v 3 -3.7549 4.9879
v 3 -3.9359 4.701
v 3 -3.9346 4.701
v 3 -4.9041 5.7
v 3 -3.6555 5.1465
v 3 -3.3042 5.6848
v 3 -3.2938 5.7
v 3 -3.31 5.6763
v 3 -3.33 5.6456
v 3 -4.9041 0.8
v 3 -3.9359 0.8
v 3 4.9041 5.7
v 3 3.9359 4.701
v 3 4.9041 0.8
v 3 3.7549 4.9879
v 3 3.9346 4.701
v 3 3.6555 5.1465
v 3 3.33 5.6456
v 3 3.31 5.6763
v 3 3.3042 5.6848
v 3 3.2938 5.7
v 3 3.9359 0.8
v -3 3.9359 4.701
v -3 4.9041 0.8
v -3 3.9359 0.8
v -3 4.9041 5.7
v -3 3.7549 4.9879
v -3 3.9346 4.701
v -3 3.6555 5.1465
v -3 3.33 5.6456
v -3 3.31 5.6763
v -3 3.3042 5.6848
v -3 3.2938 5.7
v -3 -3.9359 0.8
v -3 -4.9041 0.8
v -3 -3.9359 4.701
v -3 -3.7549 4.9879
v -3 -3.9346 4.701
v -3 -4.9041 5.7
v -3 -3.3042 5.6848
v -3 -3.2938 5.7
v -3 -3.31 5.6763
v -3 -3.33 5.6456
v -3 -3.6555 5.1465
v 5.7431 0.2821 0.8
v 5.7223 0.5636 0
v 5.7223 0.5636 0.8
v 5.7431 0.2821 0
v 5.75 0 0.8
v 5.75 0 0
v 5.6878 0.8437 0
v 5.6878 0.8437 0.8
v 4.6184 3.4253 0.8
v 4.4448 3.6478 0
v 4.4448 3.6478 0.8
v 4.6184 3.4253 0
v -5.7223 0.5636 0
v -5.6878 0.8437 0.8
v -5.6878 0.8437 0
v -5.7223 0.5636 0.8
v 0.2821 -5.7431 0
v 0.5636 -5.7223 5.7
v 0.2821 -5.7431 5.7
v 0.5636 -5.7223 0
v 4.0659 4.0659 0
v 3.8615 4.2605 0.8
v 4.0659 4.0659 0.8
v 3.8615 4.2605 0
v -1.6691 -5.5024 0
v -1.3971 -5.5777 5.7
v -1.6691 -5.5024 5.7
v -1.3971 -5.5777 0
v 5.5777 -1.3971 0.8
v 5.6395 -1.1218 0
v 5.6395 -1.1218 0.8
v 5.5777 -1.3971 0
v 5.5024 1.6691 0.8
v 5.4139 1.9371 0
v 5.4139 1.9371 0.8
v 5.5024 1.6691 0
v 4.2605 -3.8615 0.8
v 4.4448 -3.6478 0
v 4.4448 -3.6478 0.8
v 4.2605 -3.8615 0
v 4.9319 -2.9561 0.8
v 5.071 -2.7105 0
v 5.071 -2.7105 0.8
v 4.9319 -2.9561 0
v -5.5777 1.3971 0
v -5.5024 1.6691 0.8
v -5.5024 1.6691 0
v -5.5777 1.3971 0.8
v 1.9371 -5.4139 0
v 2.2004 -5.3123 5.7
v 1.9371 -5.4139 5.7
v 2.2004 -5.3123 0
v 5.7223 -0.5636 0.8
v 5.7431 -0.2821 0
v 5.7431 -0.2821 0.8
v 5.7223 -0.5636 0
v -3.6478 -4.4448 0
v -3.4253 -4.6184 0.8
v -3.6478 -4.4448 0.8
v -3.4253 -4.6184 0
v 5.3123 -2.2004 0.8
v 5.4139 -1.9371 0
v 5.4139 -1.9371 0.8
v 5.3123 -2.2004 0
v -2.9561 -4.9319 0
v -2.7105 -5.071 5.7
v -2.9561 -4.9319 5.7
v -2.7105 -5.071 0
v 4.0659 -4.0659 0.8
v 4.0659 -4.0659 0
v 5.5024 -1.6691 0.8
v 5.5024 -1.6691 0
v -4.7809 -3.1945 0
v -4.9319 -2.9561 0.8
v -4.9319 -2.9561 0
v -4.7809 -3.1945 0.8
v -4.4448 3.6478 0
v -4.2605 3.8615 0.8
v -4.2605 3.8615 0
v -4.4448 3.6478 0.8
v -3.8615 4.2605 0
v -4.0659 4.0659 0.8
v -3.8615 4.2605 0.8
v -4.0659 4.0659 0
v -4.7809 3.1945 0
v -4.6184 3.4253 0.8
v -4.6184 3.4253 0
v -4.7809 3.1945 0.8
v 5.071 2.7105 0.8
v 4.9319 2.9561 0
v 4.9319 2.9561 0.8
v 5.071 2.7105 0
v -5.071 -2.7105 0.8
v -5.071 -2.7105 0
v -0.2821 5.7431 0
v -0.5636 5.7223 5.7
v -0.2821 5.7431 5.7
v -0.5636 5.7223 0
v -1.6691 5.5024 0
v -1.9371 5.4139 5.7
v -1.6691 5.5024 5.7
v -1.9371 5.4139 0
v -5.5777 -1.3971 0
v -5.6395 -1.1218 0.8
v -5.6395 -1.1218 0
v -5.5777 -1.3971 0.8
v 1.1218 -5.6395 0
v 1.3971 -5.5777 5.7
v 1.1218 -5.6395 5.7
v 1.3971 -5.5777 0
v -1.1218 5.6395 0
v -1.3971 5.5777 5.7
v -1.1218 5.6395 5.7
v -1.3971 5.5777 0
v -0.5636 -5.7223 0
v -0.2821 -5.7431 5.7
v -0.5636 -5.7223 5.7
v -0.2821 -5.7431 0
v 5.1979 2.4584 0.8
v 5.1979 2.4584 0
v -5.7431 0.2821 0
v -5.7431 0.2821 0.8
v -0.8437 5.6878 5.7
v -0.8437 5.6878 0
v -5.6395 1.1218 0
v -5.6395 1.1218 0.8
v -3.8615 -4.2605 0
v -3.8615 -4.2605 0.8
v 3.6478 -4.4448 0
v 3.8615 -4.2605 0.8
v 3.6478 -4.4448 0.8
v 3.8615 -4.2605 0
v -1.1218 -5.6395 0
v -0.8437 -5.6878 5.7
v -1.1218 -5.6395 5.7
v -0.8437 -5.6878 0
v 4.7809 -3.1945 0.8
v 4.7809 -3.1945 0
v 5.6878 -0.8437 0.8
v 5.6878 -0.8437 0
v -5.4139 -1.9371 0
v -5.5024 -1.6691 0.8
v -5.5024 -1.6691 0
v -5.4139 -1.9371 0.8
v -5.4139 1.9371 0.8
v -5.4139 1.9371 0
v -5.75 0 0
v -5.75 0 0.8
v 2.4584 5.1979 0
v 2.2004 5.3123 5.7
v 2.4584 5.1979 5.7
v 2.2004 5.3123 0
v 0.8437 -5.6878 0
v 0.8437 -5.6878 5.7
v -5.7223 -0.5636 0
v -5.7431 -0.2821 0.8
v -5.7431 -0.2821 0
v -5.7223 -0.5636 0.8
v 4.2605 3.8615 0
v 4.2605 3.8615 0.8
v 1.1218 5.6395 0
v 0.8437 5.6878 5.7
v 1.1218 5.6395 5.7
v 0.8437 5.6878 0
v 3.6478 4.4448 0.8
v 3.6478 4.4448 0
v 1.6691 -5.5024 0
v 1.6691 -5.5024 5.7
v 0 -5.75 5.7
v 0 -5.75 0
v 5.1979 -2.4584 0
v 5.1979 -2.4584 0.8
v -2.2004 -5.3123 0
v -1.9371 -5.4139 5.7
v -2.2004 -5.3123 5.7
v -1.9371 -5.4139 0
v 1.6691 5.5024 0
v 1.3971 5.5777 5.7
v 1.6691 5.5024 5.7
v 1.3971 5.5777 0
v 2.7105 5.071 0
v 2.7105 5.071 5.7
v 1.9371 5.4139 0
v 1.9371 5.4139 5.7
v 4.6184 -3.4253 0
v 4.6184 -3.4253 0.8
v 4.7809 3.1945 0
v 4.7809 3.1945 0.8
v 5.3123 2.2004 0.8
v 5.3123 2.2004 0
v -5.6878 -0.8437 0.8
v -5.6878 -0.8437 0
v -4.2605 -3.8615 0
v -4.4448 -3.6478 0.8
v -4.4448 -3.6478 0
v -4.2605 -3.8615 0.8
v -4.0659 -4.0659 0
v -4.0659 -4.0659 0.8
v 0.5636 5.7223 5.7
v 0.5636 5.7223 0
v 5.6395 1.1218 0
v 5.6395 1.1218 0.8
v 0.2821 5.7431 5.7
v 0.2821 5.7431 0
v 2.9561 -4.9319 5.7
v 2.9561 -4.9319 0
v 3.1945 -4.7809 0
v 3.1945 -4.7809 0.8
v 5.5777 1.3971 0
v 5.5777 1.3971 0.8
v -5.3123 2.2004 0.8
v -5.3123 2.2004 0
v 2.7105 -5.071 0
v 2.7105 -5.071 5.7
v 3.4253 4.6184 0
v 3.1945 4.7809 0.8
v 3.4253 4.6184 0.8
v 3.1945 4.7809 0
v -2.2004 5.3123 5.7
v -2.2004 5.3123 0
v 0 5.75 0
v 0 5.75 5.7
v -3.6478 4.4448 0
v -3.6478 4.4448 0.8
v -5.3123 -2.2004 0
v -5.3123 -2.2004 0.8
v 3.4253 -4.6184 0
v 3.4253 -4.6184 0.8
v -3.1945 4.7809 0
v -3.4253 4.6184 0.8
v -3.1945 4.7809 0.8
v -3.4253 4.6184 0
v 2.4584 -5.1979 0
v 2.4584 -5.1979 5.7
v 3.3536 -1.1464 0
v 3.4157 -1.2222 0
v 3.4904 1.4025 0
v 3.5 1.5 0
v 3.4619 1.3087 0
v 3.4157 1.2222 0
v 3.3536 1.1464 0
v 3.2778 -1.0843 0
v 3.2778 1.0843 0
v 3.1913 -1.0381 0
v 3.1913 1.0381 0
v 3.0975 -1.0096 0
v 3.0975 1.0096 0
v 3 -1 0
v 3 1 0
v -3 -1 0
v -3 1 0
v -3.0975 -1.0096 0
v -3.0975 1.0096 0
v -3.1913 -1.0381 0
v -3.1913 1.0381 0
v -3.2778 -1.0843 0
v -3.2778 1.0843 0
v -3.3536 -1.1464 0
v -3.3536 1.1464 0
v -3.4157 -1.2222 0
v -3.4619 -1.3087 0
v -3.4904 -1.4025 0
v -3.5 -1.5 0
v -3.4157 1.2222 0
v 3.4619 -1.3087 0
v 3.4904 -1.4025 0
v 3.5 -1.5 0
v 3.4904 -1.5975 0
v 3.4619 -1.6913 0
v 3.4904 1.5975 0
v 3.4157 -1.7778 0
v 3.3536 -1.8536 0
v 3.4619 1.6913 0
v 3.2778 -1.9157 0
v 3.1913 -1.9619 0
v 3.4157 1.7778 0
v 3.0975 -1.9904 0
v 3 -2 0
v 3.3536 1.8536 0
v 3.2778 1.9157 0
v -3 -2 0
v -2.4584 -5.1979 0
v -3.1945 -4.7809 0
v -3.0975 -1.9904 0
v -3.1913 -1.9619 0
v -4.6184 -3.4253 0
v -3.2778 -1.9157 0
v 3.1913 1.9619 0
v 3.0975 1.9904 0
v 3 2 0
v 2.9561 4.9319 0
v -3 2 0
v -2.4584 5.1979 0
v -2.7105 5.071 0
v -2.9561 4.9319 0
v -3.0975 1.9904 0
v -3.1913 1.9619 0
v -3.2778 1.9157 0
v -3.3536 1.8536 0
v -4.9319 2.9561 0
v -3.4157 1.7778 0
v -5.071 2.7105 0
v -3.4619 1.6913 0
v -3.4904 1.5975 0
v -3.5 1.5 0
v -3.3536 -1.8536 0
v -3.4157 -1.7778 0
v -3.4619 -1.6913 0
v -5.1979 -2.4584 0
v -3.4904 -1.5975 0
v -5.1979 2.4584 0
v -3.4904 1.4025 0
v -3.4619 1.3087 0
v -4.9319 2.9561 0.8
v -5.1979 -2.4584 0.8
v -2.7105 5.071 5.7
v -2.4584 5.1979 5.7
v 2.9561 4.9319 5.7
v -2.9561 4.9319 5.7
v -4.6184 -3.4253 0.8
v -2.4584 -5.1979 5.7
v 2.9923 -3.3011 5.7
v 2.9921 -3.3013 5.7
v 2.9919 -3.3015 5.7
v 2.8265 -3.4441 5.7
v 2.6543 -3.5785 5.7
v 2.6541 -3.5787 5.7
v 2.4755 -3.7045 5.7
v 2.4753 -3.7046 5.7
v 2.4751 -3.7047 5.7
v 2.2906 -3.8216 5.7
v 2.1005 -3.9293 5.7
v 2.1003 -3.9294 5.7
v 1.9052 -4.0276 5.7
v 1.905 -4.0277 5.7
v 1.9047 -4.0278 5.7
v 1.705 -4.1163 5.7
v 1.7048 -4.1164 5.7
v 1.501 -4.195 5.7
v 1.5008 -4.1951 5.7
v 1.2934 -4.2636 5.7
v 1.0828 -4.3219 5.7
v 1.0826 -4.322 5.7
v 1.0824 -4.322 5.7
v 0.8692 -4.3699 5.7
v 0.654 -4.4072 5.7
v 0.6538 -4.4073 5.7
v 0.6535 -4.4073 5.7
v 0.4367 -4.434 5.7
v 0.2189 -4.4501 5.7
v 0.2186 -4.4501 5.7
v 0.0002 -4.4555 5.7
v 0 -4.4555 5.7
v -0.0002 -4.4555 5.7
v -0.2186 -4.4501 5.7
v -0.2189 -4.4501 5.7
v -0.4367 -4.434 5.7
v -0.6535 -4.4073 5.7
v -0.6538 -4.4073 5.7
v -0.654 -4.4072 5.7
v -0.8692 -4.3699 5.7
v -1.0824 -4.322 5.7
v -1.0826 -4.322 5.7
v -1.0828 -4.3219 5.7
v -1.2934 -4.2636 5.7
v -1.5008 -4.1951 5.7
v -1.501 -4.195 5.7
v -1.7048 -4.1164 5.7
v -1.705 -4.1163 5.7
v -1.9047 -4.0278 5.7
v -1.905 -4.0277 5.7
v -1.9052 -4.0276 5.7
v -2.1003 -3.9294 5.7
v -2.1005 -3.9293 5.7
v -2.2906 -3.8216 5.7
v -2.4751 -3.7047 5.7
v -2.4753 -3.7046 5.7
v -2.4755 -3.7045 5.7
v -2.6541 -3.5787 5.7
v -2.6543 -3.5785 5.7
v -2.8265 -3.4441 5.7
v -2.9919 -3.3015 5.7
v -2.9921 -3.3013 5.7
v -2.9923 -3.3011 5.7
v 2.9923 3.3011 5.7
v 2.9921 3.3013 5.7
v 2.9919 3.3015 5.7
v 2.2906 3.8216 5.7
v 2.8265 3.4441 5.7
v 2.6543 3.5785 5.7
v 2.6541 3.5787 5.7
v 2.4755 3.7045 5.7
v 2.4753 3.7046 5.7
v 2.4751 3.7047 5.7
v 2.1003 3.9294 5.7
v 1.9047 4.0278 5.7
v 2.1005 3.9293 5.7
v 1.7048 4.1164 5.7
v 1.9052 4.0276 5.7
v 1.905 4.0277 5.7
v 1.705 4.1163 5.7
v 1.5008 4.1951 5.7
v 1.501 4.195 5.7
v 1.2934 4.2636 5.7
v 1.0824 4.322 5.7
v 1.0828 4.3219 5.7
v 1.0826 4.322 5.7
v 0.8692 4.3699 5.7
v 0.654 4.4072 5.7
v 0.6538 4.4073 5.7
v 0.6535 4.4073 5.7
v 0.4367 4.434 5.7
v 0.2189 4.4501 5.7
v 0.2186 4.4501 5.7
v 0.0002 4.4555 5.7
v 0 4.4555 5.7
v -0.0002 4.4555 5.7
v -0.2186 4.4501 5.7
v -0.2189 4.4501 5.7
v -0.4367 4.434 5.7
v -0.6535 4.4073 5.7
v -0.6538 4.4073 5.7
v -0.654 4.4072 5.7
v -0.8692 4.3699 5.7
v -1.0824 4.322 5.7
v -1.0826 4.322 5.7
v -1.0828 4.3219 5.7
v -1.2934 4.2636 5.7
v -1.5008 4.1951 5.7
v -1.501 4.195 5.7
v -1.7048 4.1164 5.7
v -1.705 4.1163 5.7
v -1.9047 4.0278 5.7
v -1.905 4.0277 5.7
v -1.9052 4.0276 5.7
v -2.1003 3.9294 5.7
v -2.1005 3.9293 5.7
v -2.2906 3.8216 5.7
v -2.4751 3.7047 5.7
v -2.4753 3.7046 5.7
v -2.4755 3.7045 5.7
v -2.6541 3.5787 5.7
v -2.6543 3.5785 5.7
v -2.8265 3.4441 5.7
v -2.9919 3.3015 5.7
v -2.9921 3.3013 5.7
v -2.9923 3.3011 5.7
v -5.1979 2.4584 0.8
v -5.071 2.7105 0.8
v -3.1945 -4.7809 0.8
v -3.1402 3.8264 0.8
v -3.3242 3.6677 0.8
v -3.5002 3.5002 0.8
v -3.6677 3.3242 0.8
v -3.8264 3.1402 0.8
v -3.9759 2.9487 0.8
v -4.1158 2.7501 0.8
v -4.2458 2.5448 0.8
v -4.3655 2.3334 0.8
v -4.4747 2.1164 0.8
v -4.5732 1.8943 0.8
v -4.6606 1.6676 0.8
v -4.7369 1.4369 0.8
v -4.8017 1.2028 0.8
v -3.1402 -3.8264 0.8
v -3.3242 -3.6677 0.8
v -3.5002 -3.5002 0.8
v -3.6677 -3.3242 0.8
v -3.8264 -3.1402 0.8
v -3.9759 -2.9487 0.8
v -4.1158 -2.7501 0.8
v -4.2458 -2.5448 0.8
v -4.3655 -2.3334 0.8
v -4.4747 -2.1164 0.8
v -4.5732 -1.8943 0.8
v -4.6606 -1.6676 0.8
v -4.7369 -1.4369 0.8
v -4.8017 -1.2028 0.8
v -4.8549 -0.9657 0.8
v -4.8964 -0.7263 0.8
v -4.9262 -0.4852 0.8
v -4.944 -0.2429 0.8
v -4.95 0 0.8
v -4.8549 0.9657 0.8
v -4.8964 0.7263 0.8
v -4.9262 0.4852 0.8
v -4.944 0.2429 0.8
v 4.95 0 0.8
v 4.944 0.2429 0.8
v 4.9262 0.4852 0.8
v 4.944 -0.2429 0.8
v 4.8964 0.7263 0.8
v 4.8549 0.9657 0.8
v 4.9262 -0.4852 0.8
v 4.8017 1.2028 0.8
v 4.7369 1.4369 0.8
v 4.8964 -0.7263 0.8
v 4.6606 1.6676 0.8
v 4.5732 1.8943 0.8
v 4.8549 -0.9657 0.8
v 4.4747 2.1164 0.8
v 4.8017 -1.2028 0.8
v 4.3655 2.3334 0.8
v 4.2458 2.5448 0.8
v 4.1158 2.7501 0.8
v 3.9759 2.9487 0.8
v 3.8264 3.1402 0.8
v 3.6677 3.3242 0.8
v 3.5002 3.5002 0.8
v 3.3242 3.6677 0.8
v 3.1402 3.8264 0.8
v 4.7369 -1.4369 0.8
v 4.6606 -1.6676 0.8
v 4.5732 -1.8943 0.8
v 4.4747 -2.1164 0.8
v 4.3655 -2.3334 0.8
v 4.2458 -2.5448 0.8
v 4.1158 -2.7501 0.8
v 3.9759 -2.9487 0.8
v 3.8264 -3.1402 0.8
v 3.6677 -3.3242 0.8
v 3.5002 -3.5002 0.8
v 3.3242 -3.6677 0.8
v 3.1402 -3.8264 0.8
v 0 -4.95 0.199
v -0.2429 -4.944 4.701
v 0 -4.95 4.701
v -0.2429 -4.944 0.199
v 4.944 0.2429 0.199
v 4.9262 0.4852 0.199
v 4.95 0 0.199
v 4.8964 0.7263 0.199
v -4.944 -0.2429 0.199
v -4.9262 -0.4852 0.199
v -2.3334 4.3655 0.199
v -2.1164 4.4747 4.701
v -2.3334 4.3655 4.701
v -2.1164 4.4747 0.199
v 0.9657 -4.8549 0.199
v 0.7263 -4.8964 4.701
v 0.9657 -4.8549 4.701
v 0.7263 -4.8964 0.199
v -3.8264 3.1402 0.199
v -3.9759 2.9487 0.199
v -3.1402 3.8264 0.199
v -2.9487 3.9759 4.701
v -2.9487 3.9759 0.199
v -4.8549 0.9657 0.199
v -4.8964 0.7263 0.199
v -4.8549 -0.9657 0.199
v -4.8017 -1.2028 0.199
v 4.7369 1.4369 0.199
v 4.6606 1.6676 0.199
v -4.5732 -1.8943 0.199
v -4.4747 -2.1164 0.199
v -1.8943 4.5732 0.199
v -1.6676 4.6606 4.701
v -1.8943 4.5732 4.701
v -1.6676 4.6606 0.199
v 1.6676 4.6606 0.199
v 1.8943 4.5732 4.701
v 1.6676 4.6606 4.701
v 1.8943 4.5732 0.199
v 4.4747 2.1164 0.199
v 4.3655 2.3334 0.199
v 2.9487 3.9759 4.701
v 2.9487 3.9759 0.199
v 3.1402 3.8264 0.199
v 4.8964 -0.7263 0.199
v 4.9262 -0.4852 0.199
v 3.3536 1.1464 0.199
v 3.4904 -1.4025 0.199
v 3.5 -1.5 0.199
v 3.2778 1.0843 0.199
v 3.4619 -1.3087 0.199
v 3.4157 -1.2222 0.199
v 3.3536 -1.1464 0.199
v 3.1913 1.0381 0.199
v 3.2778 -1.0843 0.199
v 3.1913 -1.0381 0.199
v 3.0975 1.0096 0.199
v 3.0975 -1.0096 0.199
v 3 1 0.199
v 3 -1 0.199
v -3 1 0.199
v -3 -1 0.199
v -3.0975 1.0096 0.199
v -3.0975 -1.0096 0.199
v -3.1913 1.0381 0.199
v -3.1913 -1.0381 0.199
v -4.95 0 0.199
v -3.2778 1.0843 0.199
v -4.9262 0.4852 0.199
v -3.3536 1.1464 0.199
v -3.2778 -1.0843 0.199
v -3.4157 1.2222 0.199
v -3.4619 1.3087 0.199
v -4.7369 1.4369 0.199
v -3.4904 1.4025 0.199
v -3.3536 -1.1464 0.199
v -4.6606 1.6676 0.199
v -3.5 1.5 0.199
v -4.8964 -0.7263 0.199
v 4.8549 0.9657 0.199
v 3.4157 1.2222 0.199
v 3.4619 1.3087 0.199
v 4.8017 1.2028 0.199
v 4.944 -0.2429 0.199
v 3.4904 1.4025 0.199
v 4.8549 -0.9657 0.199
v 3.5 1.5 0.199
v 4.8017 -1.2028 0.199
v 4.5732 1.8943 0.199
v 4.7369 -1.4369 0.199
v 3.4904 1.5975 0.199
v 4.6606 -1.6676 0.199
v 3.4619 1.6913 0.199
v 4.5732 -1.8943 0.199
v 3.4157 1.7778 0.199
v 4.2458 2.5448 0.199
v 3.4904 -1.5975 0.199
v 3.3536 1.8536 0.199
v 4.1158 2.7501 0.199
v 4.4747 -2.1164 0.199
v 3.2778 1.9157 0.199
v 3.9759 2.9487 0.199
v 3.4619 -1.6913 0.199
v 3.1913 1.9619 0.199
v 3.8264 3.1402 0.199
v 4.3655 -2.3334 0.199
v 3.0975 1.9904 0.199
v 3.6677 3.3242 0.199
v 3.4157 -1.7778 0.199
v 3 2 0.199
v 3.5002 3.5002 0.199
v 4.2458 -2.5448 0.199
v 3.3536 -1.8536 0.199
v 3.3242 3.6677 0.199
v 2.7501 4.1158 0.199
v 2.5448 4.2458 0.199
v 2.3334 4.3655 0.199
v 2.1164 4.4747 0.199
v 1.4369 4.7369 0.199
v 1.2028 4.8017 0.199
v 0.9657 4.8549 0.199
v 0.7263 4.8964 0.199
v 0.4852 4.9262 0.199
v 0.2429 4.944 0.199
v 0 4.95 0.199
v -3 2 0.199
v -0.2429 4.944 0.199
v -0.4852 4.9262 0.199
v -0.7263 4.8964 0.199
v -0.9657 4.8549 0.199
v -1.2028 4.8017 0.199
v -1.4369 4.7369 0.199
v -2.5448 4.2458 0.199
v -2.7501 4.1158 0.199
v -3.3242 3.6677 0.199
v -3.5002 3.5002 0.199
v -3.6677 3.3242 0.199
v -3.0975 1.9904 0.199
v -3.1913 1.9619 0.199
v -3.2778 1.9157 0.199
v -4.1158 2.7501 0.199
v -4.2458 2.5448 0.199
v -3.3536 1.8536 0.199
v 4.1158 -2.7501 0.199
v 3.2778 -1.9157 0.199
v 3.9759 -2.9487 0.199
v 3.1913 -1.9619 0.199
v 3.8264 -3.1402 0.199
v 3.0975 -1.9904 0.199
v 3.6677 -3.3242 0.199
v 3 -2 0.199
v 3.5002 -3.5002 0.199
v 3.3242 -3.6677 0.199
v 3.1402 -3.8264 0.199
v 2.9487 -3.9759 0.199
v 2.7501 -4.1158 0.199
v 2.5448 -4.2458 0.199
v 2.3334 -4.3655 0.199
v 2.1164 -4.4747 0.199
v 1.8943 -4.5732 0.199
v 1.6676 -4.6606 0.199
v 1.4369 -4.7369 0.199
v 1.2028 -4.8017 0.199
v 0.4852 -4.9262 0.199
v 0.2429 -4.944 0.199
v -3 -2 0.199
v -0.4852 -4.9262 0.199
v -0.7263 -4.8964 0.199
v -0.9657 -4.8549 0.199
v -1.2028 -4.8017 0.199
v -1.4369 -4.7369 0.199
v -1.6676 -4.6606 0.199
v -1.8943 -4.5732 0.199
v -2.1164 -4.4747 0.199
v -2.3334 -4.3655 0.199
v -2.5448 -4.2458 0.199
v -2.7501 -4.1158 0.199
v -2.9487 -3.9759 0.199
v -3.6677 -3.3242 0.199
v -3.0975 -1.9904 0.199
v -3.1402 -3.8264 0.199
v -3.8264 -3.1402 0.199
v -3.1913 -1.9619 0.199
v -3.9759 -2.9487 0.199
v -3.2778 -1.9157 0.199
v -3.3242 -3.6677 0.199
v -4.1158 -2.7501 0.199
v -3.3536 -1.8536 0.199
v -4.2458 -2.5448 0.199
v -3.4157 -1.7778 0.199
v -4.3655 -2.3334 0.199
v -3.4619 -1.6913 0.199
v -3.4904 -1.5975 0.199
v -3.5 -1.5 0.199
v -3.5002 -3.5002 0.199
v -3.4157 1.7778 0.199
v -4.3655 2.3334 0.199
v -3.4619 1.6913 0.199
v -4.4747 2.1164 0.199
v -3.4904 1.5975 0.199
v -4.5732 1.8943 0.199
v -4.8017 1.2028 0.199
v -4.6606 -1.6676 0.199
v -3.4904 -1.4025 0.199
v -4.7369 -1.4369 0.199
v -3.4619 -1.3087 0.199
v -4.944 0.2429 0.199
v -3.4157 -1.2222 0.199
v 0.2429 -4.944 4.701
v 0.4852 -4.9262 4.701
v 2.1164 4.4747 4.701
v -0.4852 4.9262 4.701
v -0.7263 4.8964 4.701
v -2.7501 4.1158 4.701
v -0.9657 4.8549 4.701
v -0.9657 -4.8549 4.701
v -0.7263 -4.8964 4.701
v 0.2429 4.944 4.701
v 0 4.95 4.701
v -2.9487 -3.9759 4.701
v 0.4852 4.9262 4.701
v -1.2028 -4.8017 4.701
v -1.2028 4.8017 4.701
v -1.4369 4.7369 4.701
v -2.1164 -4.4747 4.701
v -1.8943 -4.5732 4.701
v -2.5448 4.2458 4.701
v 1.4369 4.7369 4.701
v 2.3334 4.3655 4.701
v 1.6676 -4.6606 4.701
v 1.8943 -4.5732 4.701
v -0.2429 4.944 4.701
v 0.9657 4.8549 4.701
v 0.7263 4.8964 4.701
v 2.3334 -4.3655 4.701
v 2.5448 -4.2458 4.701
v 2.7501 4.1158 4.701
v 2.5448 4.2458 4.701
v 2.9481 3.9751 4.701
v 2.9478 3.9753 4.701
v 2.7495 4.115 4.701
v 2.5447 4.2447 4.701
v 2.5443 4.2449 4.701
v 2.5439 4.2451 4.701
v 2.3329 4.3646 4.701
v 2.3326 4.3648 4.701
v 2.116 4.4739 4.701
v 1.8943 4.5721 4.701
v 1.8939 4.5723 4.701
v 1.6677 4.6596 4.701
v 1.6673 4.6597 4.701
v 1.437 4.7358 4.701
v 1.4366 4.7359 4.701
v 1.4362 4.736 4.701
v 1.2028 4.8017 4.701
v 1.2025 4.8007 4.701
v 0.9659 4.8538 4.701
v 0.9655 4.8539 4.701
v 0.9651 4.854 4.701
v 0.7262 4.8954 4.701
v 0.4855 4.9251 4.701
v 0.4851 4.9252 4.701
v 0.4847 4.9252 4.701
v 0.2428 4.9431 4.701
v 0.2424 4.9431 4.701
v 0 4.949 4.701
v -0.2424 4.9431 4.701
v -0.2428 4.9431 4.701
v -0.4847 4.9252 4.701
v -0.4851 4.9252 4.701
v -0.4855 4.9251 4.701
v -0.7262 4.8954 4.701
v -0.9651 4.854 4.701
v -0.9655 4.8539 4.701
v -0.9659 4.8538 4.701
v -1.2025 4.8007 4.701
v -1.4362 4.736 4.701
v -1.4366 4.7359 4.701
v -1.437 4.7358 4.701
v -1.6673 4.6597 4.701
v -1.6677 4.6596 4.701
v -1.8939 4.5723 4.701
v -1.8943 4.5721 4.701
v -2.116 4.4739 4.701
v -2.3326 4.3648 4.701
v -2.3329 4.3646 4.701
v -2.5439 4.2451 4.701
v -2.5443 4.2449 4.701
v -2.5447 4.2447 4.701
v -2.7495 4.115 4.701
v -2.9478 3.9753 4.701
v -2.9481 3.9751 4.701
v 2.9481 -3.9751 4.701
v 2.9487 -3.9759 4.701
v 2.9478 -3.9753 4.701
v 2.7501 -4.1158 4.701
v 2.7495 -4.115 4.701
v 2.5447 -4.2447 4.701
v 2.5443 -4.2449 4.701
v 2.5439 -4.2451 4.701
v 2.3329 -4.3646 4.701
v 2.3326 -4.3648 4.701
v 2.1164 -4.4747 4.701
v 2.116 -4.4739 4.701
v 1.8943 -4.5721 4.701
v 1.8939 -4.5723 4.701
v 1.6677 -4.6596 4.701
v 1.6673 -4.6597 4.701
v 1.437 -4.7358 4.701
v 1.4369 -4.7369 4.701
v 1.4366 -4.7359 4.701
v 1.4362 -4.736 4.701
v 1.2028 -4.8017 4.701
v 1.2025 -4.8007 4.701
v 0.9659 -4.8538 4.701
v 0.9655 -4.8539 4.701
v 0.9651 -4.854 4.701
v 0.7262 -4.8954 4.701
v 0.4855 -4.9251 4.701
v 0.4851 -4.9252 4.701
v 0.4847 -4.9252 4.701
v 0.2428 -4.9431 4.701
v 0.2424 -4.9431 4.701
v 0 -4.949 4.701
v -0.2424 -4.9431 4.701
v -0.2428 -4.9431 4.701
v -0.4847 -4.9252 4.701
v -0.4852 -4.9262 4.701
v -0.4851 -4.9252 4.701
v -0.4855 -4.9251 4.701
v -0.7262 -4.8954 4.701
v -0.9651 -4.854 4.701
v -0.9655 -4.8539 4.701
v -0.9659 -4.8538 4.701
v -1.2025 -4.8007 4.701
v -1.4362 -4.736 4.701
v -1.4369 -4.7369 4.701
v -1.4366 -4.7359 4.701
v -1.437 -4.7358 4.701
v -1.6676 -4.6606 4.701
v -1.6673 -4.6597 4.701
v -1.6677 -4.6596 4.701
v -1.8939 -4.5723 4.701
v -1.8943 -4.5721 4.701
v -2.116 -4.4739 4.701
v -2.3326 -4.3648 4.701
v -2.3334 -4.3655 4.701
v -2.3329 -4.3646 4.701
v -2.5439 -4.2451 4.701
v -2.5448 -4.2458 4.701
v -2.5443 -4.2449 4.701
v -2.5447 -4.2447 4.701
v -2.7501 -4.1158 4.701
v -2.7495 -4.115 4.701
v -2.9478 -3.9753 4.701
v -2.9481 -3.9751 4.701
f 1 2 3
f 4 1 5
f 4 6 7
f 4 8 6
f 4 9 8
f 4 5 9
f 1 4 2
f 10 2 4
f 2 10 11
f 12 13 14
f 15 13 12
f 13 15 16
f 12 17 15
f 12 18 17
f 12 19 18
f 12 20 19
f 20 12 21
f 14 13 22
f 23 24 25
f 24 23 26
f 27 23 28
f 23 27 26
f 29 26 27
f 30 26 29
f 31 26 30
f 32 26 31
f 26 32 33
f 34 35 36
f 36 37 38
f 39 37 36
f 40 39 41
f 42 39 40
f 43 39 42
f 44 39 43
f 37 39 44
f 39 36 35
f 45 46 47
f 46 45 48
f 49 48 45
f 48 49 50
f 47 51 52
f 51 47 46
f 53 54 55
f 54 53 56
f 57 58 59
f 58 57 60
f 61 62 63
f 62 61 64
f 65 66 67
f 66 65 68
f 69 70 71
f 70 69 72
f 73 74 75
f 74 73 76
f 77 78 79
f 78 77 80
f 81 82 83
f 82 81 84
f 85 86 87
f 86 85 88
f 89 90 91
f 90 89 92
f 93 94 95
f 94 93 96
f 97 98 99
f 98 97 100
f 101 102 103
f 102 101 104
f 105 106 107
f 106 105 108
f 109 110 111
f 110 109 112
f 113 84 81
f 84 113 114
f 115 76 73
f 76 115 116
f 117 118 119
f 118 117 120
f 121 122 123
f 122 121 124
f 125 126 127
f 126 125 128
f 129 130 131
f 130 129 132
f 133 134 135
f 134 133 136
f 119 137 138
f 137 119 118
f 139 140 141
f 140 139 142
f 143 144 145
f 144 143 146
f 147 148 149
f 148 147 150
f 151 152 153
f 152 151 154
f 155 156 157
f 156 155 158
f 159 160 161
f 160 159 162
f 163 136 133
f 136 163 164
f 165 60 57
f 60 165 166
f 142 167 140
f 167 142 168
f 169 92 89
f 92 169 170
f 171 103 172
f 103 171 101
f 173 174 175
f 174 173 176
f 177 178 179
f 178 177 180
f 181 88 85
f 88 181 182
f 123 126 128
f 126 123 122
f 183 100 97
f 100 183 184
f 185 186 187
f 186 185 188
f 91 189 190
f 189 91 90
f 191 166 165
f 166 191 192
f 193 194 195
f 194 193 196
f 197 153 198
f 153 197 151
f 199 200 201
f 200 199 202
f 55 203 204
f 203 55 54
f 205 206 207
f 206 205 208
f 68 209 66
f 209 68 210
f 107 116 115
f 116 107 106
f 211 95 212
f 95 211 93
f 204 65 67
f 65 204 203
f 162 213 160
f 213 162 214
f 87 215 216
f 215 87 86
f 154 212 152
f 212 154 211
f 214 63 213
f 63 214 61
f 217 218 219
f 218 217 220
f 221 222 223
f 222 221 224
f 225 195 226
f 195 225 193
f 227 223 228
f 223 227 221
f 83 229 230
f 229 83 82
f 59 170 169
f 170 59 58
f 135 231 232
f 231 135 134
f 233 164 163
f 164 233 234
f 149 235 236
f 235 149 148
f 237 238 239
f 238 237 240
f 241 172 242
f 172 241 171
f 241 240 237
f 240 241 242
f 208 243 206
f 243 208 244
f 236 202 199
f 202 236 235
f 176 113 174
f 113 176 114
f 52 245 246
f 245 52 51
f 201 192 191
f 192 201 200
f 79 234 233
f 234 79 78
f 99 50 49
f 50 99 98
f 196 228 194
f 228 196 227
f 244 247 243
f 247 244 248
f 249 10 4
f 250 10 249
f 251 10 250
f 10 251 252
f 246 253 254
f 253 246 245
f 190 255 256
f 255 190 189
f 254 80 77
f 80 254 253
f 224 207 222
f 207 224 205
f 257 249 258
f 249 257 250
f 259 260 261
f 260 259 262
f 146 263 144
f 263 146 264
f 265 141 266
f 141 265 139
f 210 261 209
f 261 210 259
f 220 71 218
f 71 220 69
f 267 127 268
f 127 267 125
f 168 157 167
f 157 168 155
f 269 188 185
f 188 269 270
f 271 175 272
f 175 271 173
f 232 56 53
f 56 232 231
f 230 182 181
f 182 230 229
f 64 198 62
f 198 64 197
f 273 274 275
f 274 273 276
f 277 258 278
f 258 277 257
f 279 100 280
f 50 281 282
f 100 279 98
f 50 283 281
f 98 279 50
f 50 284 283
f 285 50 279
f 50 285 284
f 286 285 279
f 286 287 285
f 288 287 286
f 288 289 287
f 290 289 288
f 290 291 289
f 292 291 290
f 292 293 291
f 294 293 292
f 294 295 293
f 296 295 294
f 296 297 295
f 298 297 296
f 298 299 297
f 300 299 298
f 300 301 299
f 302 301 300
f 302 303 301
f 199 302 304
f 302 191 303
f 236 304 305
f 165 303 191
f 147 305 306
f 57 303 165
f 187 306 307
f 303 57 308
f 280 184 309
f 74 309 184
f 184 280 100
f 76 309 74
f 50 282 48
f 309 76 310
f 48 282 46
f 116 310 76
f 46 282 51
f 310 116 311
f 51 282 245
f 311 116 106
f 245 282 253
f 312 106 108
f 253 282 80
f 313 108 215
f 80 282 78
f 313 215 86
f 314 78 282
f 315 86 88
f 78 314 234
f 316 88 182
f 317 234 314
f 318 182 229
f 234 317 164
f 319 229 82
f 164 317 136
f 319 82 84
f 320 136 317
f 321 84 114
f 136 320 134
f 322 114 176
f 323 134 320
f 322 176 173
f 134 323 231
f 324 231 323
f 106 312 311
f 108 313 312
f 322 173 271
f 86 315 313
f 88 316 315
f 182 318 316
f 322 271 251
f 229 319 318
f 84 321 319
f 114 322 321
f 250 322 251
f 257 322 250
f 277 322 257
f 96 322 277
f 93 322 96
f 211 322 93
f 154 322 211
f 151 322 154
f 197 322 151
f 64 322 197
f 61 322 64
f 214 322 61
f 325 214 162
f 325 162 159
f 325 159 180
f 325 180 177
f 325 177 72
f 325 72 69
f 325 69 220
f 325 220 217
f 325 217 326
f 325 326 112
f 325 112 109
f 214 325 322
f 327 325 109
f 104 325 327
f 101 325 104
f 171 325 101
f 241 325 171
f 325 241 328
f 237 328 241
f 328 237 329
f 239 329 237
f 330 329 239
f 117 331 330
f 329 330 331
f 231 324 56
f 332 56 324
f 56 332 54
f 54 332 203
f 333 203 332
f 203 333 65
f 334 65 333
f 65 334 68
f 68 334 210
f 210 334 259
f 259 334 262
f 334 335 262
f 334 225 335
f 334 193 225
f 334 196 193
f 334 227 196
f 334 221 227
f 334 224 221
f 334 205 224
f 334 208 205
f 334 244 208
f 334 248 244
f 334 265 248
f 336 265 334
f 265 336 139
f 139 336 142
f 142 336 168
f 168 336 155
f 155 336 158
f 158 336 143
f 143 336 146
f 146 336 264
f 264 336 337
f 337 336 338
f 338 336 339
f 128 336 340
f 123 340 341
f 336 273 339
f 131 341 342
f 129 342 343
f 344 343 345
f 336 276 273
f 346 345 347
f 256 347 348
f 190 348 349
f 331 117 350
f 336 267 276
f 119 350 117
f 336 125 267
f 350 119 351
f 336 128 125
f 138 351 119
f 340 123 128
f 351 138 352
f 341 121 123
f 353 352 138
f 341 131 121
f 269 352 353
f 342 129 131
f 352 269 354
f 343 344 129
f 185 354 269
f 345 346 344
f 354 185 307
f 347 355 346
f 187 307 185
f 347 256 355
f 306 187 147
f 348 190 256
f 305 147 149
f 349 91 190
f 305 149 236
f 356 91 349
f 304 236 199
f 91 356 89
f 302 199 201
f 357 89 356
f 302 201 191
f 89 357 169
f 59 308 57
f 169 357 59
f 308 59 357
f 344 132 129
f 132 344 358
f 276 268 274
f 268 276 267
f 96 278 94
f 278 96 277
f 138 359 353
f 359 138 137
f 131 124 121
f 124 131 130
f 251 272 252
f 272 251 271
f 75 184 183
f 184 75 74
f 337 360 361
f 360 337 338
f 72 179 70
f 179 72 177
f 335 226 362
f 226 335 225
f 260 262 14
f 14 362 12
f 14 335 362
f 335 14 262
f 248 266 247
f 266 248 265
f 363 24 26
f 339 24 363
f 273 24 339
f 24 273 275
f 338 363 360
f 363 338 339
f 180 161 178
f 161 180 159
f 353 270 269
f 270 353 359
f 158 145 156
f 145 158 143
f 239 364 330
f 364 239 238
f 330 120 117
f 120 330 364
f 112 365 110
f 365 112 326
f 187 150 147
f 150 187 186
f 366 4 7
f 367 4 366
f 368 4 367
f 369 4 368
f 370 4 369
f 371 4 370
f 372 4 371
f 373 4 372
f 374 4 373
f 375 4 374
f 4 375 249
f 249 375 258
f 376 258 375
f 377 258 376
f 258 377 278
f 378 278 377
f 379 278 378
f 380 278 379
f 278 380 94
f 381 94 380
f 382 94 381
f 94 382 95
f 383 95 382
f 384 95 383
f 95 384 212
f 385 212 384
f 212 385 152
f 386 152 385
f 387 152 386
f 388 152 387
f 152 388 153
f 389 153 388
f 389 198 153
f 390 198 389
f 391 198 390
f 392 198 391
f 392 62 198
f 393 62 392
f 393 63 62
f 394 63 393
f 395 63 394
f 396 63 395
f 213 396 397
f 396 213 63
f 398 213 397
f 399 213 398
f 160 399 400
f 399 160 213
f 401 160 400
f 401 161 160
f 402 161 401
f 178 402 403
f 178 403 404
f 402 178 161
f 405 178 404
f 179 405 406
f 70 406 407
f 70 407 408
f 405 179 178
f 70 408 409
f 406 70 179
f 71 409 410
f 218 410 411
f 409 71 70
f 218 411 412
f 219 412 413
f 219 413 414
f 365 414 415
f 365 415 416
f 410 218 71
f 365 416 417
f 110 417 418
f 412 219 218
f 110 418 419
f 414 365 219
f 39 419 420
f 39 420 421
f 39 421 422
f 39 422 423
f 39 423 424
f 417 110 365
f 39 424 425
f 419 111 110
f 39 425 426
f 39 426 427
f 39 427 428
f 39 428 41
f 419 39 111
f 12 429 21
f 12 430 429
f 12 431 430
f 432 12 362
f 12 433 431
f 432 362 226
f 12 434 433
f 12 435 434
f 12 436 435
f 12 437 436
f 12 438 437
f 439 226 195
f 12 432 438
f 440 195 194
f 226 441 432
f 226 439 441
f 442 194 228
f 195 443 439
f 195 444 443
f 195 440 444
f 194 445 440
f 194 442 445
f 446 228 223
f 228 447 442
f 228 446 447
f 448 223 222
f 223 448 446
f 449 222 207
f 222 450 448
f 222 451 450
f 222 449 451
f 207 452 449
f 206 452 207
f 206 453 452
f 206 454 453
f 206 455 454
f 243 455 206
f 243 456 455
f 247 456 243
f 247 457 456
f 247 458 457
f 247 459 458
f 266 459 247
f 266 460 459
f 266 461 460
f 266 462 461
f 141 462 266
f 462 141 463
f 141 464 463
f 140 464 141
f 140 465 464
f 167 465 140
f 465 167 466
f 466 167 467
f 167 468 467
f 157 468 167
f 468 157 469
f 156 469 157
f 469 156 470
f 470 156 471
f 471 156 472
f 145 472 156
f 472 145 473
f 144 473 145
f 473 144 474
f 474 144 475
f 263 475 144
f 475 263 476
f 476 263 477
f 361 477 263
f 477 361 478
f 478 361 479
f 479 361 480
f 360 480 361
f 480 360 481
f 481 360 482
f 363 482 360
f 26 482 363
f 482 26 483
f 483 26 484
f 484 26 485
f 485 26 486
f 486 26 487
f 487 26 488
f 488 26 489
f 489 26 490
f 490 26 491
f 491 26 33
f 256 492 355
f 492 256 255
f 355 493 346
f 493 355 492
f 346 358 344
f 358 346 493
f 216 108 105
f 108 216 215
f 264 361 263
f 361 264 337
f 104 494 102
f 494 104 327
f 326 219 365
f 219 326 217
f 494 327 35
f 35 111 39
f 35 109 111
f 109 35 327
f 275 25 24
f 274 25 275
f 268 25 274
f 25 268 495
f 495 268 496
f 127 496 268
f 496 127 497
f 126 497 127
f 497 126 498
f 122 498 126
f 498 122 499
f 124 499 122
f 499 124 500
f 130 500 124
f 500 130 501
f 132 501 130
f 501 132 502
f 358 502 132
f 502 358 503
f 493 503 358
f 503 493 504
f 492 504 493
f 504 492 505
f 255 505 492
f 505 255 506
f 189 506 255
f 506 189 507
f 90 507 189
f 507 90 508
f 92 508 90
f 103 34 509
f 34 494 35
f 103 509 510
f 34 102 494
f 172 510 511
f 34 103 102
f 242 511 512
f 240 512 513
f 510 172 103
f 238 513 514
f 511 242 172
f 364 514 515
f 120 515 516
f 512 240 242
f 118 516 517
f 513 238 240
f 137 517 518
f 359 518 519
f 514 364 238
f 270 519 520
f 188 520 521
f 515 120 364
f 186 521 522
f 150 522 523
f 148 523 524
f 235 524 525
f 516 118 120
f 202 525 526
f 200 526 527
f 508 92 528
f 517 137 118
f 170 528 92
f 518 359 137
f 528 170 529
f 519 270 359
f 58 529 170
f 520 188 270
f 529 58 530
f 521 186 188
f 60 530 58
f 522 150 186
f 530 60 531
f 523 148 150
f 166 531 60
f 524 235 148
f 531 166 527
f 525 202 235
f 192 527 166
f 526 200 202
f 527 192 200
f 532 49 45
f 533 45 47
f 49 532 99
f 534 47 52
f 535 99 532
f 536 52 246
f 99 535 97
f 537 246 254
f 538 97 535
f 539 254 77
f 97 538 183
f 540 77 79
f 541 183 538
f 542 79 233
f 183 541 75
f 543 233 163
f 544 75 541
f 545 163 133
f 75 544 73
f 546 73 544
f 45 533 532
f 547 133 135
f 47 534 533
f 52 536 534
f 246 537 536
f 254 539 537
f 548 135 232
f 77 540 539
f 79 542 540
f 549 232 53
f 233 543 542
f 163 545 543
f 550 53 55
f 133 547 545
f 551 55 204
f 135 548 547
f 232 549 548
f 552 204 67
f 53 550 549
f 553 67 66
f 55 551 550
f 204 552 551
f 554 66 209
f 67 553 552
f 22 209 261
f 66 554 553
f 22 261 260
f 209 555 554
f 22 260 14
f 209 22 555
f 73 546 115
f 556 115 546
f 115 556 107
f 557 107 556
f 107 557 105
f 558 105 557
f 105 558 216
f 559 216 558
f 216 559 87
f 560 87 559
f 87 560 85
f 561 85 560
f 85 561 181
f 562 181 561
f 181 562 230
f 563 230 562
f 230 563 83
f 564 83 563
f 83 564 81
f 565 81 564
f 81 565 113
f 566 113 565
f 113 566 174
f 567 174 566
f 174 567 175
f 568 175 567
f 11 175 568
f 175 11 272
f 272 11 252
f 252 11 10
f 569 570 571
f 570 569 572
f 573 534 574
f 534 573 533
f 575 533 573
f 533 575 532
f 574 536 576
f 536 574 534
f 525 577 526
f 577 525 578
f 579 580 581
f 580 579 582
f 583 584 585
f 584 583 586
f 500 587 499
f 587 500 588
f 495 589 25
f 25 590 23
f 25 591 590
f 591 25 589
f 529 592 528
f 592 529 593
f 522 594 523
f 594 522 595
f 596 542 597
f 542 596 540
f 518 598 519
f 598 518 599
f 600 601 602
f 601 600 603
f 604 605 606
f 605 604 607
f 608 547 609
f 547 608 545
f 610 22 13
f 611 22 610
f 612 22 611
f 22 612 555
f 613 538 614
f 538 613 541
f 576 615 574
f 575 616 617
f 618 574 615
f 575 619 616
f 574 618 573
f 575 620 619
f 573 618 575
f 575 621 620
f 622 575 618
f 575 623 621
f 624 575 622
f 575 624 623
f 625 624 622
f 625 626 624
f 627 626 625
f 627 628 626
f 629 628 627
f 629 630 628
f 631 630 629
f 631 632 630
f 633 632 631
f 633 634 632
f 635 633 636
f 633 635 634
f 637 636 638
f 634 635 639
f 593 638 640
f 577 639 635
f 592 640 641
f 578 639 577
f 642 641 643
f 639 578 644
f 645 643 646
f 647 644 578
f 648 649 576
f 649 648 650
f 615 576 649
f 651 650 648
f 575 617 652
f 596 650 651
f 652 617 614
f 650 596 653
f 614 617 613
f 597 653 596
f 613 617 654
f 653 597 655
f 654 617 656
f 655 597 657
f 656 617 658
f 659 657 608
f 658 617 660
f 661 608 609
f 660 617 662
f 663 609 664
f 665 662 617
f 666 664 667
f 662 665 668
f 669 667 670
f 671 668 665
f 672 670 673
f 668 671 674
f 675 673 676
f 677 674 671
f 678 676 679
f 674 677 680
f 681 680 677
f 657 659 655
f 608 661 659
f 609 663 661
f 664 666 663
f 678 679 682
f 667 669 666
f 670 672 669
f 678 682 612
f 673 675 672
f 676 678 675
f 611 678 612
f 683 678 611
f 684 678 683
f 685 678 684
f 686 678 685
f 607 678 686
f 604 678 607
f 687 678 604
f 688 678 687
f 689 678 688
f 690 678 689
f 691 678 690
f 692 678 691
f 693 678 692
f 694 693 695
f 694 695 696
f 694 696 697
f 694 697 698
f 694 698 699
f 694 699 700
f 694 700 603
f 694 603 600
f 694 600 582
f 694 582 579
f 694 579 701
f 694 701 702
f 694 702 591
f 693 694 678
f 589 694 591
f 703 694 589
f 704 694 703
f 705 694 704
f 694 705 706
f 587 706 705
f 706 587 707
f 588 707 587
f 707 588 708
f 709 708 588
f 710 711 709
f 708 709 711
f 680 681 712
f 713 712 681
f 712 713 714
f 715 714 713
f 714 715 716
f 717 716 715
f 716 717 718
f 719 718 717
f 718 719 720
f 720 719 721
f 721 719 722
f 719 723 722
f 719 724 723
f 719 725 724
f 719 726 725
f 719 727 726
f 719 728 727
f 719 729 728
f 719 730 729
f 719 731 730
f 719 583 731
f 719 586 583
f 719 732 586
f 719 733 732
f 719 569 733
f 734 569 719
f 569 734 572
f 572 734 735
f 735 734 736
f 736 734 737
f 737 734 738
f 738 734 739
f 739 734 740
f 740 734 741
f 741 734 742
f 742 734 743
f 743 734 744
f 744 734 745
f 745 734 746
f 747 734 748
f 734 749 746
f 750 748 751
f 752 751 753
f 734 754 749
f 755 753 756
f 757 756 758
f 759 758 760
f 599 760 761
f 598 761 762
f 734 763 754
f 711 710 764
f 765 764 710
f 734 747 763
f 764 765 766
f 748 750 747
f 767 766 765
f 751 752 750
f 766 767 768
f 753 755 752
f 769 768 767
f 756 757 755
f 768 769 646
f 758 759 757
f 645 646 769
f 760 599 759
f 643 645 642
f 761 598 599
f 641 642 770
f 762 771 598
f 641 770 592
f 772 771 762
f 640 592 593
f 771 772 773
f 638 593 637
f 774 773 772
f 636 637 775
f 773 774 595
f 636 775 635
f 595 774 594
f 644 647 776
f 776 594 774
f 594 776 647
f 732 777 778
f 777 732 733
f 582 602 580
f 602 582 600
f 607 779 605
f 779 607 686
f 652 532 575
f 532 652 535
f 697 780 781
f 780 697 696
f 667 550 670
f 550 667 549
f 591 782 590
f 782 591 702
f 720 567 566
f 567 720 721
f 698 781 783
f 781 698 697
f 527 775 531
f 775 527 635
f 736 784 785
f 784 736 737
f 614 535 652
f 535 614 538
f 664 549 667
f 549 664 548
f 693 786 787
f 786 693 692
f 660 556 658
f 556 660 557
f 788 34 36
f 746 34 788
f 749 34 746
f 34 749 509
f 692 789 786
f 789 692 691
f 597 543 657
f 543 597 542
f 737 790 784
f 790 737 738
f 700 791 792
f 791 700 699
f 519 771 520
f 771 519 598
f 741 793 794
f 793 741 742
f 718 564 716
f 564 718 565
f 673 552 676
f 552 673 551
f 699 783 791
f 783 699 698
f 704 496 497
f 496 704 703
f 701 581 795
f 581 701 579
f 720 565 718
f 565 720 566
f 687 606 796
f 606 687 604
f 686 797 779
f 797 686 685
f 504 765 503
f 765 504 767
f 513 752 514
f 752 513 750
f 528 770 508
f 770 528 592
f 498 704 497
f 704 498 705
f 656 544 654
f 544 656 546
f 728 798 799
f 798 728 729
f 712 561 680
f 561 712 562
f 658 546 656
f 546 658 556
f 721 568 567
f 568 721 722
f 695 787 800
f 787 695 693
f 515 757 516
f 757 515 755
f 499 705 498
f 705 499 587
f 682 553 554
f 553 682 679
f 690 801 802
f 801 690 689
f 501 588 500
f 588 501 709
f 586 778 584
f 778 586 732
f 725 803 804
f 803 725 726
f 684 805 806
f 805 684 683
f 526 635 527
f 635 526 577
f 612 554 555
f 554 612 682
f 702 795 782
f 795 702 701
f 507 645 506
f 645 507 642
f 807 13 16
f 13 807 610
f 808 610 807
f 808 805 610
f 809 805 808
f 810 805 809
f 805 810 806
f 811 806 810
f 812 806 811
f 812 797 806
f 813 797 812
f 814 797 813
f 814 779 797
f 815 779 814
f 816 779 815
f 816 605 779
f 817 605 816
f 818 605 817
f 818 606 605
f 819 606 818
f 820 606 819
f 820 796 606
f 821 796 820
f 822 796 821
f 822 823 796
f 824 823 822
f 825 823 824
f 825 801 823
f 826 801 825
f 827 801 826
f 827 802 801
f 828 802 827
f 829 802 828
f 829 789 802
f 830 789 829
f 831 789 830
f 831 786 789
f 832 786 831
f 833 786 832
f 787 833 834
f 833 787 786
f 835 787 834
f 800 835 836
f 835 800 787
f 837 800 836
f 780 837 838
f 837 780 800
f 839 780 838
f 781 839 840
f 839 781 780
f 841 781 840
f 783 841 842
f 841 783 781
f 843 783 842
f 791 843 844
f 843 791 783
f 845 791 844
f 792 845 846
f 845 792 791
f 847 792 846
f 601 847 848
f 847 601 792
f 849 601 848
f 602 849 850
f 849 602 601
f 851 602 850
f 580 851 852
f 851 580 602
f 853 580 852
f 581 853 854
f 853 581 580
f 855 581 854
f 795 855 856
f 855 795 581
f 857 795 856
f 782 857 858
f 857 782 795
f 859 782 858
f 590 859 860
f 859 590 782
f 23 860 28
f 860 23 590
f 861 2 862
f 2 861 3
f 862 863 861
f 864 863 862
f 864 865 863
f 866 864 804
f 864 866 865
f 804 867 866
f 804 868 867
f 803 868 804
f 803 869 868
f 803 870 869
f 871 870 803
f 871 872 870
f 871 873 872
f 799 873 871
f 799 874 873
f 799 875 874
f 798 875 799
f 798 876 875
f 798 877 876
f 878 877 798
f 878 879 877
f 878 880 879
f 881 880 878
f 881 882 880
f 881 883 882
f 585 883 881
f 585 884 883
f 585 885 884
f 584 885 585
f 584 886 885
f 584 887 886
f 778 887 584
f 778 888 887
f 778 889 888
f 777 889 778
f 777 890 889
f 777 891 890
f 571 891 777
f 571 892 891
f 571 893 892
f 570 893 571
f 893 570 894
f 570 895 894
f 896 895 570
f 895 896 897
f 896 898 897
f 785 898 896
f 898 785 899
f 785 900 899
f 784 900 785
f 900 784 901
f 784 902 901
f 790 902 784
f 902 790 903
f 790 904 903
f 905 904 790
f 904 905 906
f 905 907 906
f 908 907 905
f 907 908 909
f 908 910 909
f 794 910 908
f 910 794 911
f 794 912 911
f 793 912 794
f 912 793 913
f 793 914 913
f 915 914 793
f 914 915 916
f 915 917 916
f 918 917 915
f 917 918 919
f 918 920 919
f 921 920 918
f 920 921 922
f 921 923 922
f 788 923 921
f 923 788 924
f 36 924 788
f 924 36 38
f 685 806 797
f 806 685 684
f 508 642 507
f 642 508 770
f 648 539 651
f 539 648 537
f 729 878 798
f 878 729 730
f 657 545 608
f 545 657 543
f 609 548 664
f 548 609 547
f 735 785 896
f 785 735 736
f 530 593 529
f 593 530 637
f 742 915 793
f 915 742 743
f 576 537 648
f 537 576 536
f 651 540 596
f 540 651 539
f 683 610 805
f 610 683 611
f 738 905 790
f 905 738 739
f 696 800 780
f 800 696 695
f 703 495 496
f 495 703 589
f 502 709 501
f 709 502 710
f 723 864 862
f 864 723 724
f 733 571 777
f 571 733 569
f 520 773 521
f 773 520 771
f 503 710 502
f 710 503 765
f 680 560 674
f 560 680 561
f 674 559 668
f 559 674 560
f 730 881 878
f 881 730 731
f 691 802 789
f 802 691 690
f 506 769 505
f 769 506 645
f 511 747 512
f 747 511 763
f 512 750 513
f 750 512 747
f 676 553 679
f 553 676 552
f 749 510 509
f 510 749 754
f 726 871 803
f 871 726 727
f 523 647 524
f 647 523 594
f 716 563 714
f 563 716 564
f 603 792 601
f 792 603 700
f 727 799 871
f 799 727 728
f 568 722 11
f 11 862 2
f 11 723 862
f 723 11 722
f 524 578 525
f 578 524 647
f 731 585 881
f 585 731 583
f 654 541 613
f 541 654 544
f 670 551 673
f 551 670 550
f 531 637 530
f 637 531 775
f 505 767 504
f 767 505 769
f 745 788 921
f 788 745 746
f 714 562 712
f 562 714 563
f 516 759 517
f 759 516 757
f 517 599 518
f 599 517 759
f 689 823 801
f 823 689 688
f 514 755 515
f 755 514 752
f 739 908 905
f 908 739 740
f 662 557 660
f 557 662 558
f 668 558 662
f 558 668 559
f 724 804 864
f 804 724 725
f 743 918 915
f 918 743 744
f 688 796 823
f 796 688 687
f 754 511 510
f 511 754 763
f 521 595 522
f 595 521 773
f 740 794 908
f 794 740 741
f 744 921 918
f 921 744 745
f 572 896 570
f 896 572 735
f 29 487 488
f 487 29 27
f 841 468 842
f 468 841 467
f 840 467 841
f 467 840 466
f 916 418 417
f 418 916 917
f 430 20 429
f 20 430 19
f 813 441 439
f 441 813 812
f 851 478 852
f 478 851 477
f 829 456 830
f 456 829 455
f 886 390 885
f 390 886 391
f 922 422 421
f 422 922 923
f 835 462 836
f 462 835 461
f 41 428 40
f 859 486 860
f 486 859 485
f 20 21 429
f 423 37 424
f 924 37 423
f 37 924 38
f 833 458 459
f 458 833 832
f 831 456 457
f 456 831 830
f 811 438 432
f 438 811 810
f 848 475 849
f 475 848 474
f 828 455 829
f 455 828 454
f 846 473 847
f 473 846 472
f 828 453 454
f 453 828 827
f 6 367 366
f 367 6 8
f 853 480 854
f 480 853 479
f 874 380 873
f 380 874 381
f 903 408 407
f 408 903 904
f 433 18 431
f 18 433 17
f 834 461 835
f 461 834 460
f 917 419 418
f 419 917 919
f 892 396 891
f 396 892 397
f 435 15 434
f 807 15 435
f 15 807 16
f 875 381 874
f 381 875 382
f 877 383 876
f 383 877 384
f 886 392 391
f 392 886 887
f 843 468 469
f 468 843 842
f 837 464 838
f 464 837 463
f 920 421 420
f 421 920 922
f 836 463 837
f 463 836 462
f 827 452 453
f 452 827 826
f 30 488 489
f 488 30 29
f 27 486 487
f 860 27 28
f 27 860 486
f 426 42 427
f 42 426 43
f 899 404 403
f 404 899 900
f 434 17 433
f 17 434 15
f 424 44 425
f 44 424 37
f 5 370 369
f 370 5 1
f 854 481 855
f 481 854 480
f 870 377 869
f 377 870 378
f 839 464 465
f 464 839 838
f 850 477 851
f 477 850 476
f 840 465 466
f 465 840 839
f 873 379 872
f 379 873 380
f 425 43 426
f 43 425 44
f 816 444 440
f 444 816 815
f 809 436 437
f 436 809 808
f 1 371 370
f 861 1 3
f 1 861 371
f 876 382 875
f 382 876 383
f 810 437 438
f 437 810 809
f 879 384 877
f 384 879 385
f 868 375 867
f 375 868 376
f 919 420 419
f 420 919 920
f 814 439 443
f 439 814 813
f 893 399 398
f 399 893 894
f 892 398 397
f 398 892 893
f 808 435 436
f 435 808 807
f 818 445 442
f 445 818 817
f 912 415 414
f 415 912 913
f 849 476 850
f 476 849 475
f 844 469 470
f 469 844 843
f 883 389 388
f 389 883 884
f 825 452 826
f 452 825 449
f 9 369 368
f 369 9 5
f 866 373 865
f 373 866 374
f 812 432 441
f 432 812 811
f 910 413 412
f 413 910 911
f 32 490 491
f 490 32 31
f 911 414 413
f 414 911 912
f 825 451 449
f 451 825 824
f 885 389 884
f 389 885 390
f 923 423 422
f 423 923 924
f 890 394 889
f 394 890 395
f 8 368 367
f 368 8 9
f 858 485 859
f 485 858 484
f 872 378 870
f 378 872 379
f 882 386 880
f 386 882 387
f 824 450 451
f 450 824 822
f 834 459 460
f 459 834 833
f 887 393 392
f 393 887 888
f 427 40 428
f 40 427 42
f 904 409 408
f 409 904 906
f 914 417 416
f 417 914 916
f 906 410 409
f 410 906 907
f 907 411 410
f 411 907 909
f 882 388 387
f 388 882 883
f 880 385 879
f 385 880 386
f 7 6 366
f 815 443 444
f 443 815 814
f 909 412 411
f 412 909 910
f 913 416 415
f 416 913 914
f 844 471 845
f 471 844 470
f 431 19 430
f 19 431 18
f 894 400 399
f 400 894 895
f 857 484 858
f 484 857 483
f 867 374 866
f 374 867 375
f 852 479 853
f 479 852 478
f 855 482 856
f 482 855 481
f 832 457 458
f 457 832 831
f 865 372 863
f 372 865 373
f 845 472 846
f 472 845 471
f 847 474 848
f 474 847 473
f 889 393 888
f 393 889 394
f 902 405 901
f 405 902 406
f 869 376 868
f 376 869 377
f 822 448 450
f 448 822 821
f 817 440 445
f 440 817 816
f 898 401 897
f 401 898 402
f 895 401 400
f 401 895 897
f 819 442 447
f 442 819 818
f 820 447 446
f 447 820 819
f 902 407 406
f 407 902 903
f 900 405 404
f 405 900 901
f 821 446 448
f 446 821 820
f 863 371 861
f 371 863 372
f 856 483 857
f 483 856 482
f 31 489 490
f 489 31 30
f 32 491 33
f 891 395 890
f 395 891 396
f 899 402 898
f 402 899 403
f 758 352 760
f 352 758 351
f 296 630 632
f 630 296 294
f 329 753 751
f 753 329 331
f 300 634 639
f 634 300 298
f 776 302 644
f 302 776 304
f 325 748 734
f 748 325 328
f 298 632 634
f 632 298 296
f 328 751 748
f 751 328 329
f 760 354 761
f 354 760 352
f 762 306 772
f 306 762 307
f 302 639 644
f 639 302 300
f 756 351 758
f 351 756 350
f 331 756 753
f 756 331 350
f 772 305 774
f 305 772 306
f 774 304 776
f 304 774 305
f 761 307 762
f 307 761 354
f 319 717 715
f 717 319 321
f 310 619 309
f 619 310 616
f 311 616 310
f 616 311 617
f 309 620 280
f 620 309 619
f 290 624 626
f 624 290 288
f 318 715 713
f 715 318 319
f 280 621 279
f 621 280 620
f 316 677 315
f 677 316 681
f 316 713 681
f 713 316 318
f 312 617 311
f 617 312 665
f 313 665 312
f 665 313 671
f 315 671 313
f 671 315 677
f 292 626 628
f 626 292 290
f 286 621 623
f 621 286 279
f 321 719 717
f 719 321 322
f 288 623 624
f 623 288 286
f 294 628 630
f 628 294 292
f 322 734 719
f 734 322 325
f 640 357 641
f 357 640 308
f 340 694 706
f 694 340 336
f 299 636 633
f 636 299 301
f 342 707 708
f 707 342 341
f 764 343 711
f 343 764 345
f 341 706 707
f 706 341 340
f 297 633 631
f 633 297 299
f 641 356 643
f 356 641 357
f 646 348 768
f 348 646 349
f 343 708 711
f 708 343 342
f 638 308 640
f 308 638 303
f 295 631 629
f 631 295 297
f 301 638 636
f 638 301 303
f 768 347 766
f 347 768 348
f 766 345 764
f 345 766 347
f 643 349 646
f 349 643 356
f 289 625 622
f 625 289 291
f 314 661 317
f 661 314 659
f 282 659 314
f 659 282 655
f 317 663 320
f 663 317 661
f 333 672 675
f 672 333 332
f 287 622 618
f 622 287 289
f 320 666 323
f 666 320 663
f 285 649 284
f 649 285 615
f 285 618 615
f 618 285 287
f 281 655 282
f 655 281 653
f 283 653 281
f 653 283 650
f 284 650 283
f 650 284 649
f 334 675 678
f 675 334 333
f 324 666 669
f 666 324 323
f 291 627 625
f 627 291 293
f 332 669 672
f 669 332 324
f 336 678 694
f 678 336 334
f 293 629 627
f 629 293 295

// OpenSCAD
EPSILON = 0.001;

MIC_DIAMETER = 9.7;
MIC_HEIGHT = 4.5;

WALL_THICKNESS = 0.8;
MICROPHONE_MARGIN = 0.1;

BASE_THICKNESS_UNDER_MICROPHONE = 0.2;

function Microphone_holderDiameter() = MIC_DIAMETER + 2 * (WALL_THICKNESS + MICROPHONE_MARGIN);

/**
 * Microphone.
 *
 * @param positiveShape
 *     if true, draw only the positive part of the microphone,
 *     if false, draw only the negative part.
 */
module Microphone(positiveShape = true) {
    // Base
    if (positiveShape) {
        translate([0, 0, BASE_THICKNESS_UNDER_MICROPHONE])
            cylinder(h = MIC_HEIGHT, d = MIC_DIAMETER, $fn = 32);
    }
}

/**
 * Microphone holder.
 *
 * @param positiveShape
 *     if true, draw only the positive part of the microphone holder,
 *     if false, draw only the negative part.
 */
module Microphone_holder(baseThickness = 0.8, positiveShape = true) {
    horizontalSupportHeight = 1;
    
    // Base
    baseDiameter = Microphone_holderDiameter();
    if (positiveShape) {
        cylinder(h = baseThickness, d = baseDiameter, $fn = 128);
    }
    
    // Support
    wallheight = BASE_THICKNESS_UNDER_MICROPHONE + MIC_HEIGHT + horizontalSupportHeight;
    if (positiveShape) {
        difference() {
            // Positive part of the walls
            cylinder(h = wallheight, d = baseDiameter, $fn = 128);
            
            // Cut the walls in order to be able to insert the microphone
            width = 3;
            for (x = [3, -3 - width])
                translate([x, -baseDiameter / 2, baseThickness - EPSILON])
                    cube([width, baseDiameter, MIC_HEIGHT + 2]);
        }
    } else {
        // Negative part of the walls
        translate([0, 0, BASE_THICKNESS_UNDER_MICROPHONE - EPSILON])
            cylinder(h = wallheight - horizontalSupportHeight -
                         BASE_THICKNESS_UNDER_MICROPHONE + 2 * EPSILON,
                     d = baseDiameter - 2 * WALL_THICKNESS, $fn = 128);
        
        translate([0, 0, wallheight - horizontalSupportHeight - EPSILON])
            linear_extrude(height = horizontalSupportHeight + 2 * EPSILON,
                           scale=[0.9, 0.9], $fn = 128)
                circle(d = baseDiameter - 2 * WALL_THICKNESS);
    }
    
    // Clearance under the microphone
    if (!positiveShape) {
        width = 6;
        depth = 1;
        height = BASE_THICKNESS_UNDER_MICROPHONE + 2 * EPSILON;
        
        for (ypos = [-1.5, 1.5]) {
            translate([
                - width / 2,
                - depth / 2 + ypos,
                -EPSILON
            ]) {
                translate([0, depth / 2, 0])
                    cylinder(h = height, r = depth / 2, $fn = 32);
                translate([width, depth / 2, 0])
                    cylinder(h = height, r = depth / 2, $fn = 32);
                cube([width, depth, height]);
            }
        }
    }
}

/*
color("red")
difference() {
    Microphone(true);
    Microphone(false);
}
*/
difference() {
    Microphone_holder(0.8, true);
    Microphone_holder(0.8, false);
}
